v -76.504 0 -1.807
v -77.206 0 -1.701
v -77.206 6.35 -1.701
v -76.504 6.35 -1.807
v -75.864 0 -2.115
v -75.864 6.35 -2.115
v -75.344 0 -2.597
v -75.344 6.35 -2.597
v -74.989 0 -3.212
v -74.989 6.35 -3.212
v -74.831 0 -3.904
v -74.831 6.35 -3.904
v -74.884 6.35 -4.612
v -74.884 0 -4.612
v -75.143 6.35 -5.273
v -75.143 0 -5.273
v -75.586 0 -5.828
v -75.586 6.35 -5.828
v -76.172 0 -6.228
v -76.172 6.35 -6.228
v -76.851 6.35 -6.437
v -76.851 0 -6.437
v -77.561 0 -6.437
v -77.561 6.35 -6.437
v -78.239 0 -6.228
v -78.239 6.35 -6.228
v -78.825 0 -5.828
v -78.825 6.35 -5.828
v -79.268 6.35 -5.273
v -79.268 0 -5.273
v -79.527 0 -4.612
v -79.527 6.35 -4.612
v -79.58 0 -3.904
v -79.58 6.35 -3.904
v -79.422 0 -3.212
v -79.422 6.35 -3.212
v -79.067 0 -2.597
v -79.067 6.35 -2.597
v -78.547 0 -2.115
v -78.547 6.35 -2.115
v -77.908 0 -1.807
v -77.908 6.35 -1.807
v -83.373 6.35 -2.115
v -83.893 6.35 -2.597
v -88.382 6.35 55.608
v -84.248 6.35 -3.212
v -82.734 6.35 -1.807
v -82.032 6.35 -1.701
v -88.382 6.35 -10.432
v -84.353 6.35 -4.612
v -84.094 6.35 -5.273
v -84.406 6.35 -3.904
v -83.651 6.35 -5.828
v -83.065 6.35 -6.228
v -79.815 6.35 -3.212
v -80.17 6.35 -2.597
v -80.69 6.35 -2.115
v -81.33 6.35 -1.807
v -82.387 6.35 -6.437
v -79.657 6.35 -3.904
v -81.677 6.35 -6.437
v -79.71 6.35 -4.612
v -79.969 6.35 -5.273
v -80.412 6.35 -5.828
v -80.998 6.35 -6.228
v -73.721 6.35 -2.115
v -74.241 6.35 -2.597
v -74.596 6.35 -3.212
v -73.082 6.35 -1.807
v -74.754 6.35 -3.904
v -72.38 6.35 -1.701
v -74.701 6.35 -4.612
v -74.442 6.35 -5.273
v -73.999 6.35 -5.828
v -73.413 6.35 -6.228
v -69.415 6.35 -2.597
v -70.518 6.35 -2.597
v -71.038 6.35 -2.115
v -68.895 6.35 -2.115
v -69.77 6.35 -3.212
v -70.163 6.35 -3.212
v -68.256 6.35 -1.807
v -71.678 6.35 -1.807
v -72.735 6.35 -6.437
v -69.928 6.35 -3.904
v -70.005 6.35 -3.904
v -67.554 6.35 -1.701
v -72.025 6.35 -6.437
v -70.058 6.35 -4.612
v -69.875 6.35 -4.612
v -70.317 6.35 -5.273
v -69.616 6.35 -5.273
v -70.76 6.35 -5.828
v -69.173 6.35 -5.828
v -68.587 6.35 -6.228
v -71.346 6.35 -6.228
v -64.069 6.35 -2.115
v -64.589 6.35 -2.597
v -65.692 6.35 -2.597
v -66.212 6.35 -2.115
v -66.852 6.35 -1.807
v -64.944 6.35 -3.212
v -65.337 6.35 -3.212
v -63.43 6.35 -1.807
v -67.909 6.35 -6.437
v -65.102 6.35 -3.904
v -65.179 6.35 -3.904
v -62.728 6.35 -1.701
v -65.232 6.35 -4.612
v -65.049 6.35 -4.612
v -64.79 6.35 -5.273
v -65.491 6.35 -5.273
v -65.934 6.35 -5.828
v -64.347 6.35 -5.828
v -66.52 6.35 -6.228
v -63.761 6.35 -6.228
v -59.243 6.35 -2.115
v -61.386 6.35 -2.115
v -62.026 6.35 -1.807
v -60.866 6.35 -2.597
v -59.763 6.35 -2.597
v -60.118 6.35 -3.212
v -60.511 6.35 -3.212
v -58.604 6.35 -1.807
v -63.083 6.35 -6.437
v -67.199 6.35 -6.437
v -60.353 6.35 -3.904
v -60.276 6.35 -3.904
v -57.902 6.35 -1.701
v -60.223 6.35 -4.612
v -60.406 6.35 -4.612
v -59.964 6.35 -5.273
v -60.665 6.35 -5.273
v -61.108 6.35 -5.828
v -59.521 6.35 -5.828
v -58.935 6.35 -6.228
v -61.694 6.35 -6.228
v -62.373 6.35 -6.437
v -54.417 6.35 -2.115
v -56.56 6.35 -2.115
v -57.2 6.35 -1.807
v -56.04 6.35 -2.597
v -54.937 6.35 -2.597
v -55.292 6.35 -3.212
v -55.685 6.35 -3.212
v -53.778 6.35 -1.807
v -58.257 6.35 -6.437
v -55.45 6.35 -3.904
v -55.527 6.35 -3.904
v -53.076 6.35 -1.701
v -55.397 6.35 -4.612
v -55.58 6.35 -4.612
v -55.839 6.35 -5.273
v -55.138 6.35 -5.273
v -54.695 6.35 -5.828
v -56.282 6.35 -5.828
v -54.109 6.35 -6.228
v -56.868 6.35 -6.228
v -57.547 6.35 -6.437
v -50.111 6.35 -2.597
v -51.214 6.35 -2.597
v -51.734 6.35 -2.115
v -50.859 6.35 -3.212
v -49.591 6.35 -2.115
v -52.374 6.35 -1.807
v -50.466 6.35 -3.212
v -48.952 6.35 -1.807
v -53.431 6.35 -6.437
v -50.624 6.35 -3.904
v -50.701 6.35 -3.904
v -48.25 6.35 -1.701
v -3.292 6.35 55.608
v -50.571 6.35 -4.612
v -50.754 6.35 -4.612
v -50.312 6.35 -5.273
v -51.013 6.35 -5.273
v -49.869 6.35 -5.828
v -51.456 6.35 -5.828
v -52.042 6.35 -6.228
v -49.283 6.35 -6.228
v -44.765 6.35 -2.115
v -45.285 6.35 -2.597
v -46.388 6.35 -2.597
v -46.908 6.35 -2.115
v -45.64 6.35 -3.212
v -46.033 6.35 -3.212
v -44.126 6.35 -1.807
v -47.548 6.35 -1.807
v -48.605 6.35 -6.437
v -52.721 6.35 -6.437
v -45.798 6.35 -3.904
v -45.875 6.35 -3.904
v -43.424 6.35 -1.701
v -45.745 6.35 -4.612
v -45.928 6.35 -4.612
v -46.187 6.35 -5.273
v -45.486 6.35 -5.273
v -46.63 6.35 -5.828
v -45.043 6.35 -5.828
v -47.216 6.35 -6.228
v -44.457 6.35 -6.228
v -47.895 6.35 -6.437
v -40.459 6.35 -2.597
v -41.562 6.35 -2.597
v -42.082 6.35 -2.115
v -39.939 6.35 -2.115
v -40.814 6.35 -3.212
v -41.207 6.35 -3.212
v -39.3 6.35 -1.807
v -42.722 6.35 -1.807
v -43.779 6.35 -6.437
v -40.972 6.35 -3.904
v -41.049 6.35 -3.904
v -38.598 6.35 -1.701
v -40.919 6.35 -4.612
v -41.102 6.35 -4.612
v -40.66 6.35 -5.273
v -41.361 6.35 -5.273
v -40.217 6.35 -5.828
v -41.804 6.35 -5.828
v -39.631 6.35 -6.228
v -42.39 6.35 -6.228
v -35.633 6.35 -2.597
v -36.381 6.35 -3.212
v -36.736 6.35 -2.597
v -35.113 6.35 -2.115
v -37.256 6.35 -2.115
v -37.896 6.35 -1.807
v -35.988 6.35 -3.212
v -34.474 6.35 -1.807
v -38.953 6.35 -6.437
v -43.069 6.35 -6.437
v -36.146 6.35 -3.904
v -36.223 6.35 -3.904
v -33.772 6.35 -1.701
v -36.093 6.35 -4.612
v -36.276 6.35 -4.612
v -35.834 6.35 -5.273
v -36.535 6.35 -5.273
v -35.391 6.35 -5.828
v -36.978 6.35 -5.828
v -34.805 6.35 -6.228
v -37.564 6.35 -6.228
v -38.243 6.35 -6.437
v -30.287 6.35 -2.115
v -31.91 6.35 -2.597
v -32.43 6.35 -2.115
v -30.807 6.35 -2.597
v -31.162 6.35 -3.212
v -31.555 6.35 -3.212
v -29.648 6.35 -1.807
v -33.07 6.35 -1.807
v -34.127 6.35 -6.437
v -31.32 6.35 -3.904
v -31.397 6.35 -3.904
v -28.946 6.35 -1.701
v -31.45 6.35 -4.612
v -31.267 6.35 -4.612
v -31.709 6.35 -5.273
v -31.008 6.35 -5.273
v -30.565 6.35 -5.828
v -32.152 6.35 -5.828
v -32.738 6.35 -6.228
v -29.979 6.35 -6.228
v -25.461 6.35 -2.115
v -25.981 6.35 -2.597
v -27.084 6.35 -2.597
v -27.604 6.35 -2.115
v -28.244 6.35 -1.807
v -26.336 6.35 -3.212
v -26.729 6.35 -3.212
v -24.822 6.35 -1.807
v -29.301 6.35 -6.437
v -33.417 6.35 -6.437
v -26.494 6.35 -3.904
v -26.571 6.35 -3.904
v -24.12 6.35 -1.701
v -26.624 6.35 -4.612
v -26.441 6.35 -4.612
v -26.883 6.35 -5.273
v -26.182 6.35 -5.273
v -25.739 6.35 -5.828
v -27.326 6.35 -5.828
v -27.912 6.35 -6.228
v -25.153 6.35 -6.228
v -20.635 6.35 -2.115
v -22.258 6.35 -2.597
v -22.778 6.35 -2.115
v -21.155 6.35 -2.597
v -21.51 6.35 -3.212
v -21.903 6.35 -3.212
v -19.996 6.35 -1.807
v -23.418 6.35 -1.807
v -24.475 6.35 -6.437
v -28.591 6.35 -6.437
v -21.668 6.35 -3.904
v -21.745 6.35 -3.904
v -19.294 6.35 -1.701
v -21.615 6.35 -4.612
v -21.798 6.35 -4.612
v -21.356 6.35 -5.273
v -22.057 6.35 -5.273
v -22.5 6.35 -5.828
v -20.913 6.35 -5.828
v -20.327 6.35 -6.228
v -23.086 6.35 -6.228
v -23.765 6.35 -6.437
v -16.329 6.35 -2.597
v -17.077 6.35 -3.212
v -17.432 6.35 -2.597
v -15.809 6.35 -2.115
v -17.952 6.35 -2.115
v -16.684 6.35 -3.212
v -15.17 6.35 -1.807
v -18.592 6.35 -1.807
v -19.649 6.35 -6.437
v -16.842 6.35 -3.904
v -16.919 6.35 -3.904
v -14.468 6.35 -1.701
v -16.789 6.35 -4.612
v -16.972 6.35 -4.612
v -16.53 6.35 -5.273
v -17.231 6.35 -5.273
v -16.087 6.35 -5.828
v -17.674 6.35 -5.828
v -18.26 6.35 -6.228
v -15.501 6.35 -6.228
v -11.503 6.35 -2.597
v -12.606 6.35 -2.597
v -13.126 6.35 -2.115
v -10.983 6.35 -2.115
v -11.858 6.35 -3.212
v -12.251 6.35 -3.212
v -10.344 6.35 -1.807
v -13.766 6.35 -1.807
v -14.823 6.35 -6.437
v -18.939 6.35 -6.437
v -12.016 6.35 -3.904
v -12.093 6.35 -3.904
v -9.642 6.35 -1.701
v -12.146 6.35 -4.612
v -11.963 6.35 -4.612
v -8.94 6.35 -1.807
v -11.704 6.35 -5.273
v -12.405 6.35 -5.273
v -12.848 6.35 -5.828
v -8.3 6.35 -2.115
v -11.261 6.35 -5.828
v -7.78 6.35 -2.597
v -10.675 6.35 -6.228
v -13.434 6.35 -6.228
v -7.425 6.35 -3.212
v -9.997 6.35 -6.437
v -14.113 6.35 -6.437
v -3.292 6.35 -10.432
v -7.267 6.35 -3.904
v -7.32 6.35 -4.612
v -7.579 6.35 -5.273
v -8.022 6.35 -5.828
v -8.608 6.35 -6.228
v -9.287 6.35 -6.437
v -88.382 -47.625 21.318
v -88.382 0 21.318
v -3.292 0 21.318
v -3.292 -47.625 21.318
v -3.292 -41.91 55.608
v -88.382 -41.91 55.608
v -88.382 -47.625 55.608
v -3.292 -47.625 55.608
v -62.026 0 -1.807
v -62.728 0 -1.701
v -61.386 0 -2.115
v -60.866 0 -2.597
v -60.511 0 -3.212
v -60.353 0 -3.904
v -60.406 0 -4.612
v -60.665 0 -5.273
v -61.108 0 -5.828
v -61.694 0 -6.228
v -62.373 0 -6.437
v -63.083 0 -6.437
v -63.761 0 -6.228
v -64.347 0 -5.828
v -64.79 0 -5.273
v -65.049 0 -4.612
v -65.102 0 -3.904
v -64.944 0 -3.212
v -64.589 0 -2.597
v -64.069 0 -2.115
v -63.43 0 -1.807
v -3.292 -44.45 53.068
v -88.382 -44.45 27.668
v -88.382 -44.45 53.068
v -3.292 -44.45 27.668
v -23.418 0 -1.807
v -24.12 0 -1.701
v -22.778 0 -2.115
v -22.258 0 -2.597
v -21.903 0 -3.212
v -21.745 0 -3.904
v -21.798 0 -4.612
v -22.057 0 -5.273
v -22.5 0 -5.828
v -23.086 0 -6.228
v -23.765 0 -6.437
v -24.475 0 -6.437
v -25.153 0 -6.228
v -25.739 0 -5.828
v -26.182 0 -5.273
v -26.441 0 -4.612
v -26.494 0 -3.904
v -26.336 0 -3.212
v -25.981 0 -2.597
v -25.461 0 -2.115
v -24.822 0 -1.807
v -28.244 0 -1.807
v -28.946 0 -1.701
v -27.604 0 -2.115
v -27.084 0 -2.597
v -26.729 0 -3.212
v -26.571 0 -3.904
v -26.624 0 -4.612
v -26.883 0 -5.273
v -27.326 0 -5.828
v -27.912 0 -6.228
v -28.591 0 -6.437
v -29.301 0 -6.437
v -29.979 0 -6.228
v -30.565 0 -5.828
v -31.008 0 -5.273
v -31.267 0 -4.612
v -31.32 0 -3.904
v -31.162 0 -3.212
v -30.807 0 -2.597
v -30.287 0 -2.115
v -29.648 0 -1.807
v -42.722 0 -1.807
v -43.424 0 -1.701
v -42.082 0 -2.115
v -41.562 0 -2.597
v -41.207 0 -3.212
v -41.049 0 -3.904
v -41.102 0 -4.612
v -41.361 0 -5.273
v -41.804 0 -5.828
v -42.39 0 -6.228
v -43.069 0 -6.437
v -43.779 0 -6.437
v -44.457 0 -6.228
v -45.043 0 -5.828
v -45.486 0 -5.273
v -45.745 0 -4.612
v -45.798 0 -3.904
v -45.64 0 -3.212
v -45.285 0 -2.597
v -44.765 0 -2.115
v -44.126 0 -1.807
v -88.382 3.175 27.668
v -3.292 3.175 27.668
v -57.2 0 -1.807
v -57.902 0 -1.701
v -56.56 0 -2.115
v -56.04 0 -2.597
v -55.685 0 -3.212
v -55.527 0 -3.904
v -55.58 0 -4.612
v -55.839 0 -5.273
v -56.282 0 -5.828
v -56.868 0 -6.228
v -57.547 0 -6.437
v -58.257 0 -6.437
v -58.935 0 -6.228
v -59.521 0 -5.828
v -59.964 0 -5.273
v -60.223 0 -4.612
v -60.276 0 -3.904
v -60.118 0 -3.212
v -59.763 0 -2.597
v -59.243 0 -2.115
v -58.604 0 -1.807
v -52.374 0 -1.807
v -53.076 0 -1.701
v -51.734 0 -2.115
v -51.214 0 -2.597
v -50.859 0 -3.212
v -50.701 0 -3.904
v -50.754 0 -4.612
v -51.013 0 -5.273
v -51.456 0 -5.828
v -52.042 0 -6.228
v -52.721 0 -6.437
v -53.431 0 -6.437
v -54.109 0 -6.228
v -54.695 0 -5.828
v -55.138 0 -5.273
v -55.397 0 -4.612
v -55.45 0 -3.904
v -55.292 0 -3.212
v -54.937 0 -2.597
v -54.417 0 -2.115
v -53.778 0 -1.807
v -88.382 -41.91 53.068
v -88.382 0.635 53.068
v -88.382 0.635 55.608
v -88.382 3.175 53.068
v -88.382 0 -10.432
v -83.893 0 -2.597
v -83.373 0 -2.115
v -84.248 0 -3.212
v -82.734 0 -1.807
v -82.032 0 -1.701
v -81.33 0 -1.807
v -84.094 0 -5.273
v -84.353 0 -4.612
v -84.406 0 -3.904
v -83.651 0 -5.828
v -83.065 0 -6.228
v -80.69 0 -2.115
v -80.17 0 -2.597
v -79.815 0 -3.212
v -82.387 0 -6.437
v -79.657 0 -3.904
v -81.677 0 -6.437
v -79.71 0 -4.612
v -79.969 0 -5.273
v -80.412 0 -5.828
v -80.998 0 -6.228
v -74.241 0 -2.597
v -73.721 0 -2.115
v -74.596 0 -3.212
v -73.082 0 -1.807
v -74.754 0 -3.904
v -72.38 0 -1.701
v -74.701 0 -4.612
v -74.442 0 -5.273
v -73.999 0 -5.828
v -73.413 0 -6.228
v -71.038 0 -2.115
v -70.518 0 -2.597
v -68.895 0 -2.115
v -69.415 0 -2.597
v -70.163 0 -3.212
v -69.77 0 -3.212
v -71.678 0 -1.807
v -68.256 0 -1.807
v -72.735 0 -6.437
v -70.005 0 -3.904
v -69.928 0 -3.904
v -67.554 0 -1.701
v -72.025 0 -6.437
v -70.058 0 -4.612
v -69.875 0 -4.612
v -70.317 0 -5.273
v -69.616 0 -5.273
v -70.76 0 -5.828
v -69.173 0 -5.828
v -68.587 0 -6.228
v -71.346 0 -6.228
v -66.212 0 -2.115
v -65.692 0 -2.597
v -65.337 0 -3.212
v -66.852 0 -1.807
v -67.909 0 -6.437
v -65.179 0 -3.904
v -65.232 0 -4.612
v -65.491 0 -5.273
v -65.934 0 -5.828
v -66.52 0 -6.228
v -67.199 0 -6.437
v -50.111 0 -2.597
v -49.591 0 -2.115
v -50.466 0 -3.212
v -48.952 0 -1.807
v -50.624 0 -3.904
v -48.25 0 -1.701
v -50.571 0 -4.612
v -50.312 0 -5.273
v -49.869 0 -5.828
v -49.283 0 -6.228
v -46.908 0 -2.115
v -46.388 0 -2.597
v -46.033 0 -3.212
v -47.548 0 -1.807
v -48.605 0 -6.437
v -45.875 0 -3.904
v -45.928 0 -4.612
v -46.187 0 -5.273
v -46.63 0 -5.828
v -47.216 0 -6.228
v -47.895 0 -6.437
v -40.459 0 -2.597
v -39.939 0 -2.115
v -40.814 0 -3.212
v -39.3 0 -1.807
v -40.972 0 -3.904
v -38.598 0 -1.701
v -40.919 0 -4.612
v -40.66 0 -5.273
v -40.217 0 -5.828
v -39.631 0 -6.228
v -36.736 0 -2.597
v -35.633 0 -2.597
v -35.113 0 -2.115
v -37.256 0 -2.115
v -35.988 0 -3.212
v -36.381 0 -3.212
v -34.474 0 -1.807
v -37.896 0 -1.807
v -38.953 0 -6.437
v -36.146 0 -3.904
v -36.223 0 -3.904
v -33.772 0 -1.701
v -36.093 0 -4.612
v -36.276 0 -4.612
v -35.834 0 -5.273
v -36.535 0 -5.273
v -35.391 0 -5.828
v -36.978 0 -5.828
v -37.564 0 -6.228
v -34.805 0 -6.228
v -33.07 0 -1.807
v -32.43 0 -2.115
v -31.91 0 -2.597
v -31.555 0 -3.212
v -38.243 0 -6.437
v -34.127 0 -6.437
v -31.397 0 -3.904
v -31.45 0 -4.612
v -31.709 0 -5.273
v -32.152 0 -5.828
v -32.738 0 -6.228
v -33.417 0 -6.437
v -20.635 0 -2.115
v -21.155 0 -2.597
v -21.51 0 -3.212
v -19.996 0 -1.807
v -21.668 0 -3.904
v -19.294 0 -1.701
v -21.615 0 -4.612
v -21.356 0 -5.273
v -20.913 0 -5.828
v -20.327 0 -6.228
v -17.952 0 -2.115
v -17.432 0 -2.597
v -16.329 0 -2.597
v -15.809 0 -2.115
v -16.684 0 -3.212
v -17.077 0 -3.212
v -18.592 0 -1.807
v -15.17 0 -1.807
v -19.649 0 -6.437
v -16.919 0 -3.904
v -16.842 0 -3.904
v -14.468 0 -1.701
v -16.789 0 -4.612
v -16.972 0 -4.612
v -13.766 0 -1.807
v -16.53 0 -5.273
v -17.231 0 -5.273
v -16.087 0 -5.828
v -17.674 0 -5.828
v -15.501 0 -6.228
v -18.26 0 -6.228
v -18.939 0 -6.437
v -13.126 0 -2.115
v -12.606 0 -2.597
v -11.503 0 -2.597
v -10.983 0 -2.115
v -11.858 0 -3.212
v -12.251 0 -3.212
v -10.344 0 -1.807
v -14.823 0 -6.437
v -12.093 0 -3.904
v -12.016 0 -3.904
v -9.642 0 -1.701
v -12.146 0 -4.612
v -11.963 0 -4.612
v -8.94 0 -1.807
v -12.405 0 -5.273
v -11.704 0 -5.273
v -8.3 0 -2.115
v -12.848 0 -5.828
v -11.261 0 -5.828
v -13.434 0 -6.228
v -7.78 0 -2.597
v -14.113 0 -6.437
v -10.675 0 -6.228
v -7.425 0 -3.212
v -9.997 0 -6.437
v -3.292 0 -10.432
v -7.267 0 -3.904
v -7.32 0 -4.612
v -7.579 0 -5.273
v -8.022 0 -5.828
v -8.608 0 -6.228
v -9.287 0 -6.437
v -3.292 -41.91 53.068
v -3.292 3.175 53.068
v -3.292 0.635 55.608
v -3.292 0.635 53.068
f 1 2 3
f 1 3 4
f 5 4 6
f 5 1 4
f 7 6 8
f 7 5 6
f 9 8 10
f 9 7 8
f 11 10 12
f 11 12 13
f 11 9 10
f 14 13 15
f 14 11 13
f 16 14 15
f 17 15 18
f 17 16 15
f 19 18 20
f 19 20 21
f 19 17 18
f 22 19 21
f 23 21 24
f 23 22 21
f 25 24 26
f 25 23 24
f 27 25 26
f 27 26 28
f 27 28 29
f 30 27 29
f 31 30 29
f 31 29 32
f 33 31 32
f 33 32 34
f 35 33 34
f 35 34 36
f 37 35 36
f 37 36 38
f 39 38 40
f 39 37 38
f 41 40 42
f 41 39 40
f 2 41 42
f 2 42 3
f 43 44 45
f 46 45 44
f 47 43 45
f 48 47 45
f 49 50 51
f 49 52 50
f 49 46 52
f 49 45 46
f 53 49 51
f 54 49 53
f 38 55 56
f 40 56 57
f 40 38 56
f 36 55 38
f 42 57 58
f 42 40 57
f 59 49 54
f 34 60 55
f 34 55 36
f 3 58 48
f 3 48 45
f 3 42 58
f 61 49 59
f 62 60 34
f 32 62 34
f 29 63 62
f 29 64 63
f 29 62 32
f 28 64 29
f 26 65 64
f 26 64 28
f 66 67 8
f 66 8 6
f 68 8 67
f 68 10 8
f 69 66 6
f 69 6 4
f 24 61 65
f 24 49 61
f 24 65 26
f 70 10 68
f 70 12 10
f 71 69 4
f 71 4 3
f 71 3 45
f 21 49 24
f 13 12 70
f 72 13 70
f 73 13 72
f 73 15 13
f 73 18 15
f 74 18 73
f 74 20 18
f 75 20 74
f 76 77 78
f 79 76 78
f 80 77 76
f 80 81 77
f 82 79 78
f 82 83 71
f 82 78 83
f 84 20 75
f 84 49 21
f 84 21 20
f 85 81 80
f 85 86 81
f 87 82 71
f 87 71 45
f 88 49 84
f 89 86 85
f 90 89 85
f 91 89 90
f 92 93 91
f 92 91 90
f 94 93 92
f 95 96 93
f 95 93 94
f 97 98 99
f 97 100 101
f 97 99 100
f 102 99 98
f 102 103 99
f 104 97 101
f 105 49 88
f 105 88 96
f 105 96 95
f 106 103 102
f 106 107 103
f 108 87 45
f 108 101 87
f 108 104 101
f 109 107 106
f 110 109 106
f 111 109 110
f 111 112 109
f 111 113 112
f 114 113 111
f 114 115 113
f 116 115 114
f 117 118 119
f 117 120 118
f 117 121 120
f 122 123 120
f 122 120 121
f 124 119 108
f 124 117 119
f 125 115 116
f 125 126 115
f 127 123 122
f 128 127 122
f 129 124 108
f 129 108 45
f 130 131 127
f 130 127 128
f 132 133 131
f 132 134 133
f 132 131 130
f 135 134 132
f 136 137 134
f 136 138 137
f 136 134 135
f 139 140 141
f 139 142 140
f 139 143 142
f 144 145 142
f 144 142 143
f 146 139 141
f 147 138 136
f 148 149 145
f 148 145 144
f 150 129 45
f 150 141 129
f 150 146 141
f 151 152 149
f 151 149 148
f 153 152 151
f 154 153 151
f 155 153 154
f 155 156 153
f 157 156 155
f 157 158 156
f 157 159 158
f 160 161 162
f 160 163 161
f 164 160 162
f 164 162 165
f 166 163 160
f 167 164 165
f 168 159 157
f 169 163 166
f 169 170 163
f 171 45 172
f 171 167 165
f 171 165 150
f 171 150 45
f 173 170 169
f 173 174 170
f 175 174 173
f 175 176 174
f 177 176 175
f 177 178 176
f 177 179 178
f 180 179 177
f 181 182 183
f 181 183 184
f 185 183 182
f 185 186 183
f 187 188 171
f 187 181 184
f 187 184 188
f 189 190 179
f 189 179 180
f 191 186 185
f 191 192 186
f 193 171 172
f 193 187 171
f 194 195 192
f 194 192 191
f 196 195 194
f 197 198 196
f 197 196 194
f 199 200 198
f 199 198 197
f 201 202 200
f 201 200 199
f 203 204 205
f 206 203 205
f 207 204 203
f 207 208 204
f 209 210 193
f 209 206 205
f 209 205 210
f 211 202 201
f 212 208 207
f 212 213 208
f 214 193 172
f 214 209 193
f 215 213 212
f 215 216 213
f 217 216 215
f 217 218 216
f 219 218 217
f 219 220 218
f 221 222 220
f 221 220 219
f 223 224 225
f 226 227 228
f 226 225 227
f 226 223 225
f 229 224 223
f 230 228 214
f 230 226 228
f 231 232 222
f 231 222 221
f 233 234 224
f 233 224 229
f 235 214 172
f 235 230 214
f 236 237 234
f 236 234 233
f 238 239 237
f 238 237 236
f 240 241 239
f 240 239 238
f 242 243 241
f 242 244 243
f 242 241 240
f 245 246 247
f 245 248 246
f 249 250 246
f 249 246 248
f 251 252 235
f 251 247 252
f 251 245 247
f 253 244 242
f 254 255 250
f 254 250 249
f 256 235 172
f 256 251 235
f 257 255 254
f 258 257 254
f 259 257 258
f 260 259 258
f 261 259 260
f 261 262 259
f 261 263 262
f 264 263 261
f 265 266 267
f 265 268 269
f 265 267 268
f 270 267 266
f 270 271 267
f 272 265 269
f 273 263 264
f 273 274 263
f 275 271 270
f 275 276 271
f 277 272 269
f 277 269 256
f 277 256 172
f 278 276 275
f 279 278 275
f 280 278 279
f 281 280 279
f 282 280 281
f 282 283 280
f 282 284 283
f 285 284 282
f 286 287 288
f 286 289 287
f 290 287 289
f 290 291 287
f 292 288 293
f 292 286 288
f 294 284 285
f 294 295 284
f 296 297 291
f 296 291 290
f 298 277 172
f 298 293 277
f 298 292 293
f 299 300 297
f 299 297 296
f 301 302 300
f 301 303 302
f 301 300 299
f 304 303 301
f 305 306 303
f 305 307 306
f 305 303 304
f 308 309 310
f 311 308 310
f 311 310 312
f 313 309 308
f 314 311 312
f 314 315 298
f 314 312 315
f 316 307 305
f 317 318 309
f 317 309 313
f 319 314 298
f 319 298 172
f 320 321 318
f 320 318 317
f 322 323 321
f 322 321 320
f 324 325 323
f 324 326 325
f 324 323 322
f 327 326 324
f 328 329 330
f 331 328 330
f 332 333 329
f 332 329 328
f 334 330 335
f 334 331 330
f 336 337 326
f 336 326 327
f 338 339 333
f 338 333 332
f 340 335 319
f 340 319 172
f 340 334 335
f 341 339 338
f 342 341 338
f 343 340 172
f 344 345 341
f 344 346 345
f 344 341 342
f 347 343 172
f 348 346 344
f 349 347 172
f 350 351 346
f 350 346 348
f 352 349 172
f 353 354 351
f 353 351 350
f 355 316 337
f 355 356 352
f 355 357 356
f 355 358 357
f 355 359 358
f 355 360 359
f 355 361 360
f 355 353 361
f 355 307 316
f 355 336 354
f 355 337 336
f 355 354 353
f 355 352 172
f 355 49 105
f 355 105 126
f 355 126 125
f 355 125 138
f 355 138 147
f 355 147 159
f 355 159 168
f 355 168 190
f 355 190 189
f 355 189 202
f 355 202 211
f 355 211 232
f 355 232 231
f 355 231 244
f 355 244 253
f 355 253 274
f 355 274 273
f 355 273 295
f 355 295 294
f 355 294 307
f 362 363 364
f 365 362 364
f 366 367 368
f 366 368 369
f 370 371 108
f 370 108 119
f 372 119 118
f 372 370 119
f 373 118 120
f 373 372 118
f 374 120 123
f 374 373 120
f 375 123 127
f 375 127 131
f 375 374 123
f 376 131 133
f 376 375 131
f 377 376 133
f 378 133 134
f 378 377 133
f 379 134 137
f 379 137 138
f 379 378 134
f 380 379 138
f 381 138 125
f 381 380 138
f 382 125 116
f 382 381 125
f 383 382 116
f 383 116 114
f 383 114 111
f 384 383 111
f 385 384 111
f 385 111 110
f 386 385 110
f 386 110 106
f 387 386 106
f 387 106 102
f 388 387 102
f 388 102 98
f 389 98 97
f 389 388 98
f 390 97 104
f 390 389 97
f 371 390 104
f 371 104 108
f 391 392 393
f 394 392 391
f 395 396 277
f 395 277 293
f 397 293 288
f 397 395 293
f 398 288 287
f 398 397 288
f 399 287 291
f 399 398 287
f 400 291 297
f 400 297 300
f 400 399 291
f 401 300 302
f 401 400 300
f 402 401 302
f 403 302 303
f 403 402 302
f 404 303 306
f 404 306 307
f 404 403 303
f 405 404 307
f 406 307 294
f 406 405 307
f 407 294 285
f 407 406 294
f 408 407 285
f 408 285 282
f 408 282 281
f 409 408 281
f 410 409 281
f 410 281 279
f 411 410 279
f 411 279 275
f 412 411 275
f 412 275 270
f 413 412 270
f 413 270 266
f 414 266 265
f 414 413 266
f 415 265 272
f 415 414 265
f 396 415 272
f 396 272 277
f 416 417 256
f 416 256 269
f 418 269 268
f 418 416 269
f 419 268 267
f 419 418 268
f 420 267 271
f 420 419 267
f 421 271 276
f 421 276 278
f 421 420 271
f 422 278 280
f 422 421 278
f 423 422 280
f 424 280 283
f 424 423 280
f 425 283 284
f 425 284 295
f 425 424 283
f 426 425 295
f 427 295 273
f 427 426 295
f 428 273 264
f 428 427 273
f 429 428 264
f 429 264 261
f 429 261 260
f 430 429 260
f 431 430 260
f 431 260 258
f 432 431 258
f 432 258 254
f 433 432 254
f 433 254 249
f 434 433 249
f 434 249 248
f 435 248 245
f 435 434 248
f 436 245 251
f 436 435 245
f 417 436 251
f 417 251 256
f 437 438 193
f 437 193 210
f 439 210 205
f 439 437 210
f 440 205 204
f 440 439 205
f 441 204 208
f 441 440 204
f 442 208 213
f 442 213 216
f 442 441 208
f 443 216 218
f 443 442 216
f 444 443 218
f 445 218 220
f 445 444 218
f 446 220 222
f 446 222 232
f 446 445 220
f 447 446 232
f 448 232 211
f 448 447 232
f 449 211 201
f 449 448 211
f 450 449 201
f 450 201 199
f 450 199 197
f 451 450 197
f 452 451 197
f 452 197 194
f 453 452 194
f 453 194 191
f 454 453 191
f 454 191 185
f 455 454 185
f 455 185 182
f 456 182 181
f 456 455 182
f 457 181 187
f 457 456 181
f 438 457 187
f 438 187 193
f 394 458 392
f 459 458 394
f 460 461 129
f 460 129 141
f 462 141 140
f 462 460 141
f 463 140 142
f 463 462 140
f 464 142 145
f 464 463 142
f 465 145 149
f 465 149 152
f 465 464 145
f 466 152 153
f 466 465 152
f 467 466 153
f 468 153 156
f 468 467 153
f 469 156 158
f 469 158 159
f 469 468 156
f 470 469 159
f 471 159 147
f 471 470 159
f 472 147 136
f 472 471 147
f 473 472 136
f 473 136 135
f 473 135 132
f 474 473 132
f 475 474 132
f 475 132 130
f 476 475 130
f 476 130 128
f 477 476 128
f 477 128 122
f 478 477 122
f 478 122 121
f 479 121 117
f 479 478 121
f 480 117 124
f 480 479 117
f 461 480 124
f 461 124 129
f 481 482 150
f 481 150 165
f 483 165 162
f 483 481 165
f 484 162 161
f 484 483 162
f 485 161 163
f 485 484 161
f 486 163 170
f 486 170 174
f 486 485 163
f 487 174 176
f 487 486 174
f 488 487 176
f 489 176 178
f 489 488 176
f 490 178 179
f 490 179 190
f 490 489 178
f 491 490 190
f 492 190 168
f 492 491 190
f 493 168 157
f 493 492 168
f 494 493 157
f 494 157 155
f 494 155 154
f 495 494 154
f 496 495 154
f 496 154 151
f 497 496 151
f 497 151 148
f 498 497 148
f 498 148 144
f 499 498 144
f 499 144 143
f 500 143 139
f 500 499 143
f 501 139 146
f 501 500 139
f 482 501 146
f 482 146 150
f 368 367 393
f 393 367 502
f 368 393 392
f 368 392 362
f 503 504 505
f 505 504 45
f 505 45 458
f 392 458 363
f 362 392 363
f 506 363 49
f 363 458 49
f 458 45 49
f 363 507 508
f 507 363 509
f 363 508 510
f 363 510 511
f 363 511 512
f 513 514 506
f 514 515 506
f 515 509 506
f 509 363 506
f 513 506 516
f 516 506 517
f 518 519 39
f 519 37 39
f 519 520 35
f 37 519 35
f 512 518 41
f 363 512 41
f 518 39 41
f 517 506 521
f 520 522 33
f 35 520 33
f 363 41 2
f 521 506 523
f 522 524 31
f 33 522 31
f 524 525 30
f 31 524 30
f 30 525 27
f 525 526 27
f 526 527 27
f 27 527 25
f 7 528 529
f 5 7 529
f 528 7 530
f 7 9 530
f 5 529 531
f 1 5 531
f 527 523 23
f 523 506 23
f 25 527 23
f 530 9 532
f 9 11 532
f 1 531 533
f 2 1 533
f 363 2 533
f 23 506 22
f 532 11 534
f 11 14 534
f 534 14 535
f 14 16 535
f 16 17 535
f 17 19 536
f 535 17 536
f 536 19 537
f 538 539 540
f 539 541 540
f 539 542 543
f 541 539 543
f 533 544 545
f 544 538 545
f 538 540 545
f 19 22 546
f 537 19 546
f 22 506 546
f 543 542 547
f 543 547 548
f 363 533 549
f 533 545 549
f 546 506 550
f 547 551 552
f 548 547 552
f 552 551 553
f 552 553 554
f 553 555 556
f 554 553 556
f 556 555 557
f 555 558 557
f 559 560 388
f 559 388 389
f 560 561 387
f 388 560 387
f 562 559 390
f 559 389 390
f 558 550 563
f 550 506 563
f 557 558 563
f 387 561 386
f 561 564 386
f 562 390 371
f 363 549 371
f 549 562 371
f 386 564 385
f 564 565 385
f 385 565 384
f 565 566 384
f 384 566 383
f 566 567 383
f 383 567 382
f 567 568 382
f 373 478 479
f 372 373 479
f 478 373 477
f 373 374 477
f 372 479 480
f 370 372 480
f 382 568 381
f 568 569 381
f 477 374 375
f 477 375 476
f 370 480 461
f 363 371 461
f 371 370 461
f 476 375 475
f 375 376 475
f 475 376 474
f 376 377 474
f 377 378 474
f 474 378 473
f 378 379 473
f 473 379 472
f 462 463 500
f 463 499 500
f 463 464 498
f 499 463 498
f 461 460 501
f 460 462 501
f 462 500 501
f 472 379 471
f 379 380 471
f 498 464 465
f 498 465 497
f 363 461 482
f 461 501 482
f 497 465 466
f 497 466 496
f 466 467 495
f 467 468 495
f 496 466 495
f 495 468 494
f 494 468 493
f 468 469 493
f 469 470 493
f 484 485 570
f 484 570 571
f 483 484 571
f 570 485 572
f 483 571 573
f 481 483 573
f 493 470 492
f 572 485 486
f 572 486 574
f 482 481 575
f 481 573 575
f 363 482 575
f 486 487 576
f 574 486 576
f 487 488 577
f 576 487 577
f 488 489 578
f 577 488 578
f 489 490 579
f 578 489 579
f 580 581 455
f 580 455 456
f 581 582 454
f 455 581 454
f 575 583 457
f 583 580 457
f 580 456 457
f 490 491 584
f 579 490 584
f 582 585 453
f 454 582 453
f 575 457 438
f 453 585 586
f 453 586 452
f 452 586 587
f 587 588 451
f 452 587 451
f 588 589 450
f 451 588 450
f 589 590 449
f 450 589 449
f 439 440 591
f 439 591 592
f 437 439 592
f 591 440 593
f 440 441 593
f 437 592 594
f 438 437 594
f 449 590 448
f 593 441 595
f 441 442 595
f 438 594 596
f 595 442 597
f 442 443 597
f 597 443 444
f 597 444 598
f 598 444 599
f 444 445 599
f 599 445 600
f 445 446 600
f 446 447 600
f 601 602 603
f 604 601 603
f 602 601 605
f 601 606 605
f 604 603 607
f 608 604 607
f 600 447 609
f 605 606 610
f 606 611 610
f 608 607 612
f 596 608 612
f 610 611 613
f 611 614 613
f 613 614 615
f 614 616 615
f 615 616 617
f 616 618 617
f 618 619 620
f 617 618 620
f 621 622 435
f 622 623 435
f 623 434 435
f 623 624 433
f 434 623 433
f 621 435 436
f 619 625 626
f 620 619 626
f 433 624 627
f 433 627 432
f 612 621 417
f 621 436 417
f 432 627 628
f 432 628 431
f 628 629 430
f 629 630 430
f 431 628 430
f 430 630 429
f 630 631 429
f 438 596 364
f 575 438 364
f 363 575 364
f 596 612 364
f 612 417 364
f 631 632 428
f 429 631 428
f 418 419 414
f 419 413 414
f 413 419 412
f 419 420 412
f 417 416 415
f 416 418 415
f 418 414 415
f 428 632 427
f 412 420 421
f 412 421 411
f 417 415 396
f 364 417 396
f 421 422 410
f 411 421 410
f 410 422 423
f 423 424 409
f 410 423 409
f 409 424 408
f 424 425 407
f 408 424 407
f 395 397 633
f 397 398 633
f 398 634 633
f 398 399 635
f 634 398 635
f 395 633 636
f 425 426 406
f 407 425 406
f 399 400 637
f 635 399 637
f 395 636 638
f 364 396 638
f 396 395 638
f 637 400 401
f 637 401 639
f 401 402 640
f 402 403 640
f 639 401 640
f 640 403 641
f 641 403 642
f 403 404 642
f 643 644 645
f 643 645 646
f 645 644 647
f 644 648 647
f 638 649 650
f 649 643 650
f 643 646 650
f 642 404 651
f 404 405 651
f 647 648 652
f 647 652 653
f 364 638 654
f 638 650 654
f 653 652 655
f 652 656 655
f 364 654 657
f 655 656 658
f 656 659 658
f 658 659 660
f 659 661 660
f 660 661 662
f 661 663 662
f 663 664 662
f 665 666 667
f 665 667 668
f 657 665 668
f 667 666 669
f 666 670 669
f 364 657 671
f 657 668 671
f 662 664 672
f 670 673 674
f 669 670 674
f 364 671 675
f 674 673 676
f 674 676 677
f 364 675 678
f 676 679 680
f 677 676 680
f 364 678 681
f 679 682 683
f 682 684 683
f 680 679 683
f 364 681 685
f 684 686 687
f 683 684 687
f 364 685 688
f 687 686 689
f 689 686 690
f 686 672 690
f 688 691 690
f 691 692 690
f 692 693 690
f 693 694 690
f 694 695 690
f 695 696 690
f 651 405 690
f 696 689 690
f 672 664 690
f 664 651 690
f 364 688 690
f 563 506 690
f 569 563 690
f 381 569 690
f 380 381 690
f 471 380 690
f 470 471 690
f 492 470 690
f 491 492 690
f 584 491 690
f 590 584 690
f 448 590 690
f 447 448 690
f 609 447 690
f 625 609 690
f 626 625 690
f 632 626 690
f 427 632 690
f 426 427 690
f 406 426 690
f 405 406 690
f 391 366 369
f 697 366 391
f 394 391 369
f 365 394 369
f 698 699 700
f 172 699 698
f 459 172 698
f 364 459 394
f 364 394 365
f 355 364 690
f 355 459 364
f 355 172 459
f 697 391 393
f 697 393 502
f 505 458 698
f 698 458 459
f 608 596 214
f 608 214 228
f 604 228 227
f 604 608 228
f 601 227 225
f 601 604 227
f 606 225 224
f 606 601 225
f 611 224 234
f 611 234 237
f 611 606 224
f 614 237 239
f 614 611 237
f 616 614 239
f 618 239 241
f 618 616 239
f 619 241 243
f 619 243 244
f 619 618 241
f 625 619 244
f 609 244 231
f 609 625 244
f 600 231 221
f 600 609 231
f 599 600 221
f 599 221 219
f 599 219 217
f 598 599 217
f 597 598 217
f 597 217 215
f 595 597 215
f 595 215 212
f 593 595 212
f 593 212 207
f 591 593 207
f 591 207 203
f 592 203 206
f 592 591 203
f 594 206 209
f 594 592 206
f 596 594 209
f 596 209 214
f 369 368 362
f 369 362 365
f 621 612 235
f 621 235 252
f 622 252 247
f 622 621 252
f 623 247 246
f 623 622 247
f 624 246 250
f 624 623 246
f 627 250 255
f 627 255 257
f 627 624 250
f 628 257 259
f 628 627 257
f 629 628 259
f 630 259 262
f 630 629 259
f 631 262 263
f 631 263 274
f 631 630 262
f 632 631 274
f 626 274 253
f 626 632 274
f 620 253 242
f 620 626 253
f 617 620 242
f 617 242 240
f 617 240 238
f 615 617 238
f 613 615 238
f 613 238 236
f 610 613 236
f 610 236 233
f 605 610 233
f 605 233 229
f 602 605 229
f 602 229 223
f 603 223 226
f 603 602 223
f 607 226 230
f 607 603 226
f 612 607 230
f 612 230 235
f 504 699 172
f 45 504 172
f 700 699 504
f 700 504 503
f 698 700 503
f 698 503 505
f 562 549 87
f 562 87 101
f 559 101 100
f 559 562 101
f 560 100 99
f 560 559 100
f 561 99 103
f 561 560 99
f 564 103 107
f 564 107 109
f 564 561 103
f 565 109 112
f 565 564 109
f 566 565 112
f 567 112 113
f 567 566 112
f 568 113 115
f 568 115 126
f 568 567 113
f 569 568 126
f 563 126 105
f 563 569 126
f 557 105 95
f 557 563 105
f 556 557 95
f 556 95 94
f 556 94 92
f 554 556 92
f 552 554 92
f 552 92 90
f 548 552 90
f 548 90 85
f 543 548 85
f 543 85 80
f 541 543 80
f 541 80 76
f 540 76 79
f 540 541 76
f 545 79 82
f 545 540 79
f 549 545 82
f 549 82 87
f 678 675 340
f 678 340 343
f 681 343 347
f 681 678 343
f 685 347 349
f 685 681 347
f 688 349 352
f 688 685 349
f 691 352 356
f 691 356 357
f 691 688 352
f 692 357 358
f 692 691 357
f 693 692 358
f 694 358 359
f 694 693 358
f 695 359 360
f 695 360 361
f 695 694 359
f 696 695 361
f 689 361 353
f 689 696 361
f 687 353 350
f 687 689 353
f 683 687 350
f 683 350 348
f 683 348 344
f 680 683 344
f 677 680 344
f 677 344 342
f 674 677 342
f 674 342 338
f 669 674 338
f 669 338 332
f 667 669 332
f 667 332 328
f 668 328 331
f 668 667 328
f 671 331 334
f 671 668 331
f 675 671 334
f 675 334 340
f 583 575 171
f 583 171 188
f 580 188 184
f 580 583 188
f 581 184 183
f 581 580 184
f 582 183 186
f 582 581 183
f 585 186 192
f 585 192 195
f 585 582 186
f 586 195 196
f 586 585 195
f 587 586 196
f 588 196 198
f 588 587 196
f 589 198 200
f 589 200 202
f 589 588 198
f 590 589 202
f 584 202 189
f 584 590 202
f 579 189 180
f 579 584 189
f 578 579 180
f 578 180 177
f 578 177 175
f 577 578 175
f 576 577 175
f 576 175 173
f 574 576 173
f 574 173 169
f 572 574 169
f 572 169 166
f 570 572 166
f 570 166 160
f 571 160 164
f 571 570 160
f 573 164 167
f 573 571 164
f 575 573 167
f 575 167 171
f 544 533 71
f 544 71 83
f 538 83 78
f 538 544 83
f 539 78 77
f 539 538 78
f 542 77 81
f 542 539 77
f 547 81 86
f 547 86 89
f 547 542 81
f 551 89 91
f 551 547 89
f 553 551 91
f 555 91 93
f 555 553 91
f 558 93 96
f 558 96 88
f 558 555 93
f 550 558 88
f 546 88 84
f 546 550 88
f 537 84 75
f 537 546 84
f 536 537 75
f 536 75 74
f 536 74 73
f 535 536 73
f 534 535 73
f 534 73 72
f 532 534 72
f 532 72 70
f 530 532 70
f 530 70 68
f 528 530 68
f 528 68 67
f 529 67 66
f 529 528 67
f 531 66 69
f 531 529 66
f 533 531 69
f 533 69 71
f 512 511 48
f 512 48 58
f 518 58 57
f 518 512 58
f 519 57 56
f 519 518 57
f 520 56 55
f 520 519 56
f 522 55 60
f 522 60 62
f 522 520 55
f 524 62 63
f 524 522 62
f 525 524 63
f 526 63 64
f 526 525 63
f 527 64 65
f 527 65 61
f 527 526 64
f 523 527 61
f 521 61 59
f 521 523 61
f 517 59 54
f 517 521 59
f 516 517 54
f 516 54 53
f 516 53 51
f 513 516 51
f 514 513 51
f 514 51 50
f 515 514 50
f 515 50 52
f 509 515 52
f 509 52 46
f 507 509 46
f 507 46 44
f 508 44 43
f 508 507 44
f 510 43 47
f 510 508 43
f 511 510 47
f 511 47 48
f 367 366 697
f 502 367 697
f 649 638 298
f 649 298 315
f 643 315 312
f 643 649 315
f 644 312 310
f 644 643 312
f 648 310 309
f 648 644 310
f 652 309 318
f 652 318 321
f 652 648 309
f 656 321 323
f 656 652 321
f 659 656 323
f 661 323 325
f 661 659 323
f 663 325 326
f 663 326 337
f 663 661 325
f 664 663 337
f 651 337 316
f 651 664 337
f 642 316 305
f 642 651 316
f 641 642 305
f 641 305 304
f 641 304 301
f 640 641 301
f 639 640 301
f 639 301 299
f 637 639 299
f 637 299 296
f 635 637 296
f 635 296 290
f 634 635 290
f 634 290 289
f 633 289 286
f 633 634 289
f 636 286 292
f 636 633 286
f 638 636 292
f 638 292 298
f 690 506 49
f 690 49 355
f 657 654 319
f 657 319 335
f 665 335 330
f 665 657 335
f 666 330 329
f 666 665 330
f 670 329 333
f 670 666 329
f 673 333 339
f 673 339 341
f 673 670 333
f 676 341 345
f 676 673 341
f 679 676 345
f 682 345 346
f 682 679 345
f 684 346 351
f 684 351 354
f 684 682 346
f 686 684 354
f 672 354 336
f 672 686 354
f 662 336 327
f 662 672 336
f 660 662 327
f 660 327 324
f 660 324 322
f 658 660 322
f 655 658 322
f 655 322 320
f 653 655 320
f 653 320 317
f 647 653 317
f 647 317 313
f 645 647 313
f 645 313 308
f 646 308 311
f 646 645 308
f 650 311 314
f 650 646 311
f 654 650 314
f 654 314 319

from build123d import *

# Parameters (mm, degrees)
SKETCH1_W           = 85.09
SKETCH1_H           = 38.1
SKETCH1_R           = 2.38125
BOSS_EXTRUDE1_DEPTH = 6.35
SKETCH2_W           = 85.09
SKETCH2_H           = 6.35
BOSS_EXTRUDE2_DEPTH = 47.625
SKETCH3_W           = 85.09
SKETCH3_H           = 3.175
BOSS_EXTRUDE3_DEPTH = 27.94
SKETCH4_W           = 2.54
SKETCH4_H           = 2.54
BOSS_EXTRUDE4_DEPTH = 85.09


with BuildPart() as part:
    # Sketch1 → Boss-Extrude1 (new body)
    with BuildSketch(Plane(origin=(0, 0, 0), x_dir=(1, 0, 0), z_dir=(0, 1, 0))):
        with Locations((-45.836632653, -8.617857143)):
            Rectangle(SKETCH1_W, SKETCH1_H)
        with Locations(Location((-82.031632653, 4.082142857, 0), (0, 0, 270))):
            Circle(SKETCH1_R, mode=Mode.SUBTRACT)
        with Locations(Location((-77.205632653, 4.082142857, 0), (0, 0, 270))):
            Circle(SKETCH1_R, mode=Mode.SUBTRACT)
        with Locations(Location((-72.379632653, 4.082142857, 0), (0, 0, 270))):
            Circle(SKETCH1_R, mode=Mode.SUBTRACT)
        with Locations(Location((-67.553632653, 4.082142857, 0), (0, 0, 270))):
            Circle(SKETCH1_R, mode=Mode.SUBTRACT)
        with Locations(Location((-62.727632653, 4.082142857, 0), (0, 0, 270))):
            Circle(SKETCH1_R, mode=Mode.SUBTRACT)
        with Locations(Location((-57.901632653, 4.082142857, 0), (0, 0, 270))):
            Circle(SKETCH1_R, mode=Mode.SUBTRACT)
        with Locations(Location((-53.075632653, 4.082142857, 0), (0, 0, 270))):
            Circle(SKETCH1_R, mode=Mode.SUBTRACT)
        with Locations(Location((-48.249632653, 4.082142857, 0), (0, 0, 270))):
            Circle(SKETCH1_R, mode=Mode.SUBTRACT)
        with Locations(Location((-43.423632653, 4.082142857, 0), (0, 0, 270))):
            Circle(SKETCH1_R, mode=Mode.SUBTRACT)
        with Locations(Location((-38.597632653, 4.082142857, 0), (0, 0, 270))):
            Circle(SKETCH1_R, mode=Mode.SUBTRACT)
        with Locations(Location((-33.771632653, 4.082142857, 0), (0, 0, 270))):
            Circle(SKETCH1_R, mode=Mode.SUBTRACT)
        with Locations(Location((-28.945632653, 4.082142857, 0), (0, 0, 270))):
            Circle(SKETCH1_R, mode=Mode.SUBTRACT)
        with Locations(Location((-24.119632653, 4.082142857, 0), (0, 0, 270))):
            Circle(SKETCH1_R, mode=Mode.SUBTRACT)
        with Locations(Location((-19.293632653, 4.082142857, 0), (0, 0, 270))):
            Circle(SKETCH1_R, mode=Mode.SUBTRACT)
        with Locations(Location((-14.467632653, 4.082142857, 0), (0, 0, 270))):
            Circle(SKETCH1_R, mode=Mode.SUBTRACT)
        with Locations(Location((-9.641632653, 4.082142857, 0), (0, 0, 270))):
            Circle(SKETCH1_R, mode=Mode.SUBTRACT)
    extrude(amount=BOSS_EXTRUDE1_DEPTH)

    # Sketch2 → Boss-Extrude2 (add)
    with BuildSketch(Plane.XZ):
        with Locations((-45.836632653, 24.492857143)):
            Rectangle(SKETCH2_W, SKETCH2_H)
    extrude(amount=BOSS_EXTRUDE2_DEPTH)

    # Sketch3 → Boss-Extrude3 (add)
    with BuildSketch(Plane.XY.offset(27.667857143)):
        with Locations((-45.836632653, 4.7625)):
            Rectangle(SKETCH3_W, SKETCH3_H)
        with Locations((-45.836632653, -46.0375)):
            Rectangle(SKETCH3_W, SKETCH3_H)
    extrude(amount=BOSS_EXTRUDE3_DEPTH)

    # Sketch4 → Boss-Extrude4 (add)
    with BuildSketch(Plane(origin=(-3.291632653, 0, 0), x_dir=(0, 0, -1), z_dir=(1, 0, 0))):
        with Locations((-54.337857143, 1.905)):
            Rectangle(SKETCH4_W, SKETCH4_H)
        with Locations((-54.337857143, -43.18)):
            Rectangle(SKETCH4_W, SKETCH4_H)
    extrude(amount=-BOSS_EXTRUDE4_DEPTH)


solid = part.part
